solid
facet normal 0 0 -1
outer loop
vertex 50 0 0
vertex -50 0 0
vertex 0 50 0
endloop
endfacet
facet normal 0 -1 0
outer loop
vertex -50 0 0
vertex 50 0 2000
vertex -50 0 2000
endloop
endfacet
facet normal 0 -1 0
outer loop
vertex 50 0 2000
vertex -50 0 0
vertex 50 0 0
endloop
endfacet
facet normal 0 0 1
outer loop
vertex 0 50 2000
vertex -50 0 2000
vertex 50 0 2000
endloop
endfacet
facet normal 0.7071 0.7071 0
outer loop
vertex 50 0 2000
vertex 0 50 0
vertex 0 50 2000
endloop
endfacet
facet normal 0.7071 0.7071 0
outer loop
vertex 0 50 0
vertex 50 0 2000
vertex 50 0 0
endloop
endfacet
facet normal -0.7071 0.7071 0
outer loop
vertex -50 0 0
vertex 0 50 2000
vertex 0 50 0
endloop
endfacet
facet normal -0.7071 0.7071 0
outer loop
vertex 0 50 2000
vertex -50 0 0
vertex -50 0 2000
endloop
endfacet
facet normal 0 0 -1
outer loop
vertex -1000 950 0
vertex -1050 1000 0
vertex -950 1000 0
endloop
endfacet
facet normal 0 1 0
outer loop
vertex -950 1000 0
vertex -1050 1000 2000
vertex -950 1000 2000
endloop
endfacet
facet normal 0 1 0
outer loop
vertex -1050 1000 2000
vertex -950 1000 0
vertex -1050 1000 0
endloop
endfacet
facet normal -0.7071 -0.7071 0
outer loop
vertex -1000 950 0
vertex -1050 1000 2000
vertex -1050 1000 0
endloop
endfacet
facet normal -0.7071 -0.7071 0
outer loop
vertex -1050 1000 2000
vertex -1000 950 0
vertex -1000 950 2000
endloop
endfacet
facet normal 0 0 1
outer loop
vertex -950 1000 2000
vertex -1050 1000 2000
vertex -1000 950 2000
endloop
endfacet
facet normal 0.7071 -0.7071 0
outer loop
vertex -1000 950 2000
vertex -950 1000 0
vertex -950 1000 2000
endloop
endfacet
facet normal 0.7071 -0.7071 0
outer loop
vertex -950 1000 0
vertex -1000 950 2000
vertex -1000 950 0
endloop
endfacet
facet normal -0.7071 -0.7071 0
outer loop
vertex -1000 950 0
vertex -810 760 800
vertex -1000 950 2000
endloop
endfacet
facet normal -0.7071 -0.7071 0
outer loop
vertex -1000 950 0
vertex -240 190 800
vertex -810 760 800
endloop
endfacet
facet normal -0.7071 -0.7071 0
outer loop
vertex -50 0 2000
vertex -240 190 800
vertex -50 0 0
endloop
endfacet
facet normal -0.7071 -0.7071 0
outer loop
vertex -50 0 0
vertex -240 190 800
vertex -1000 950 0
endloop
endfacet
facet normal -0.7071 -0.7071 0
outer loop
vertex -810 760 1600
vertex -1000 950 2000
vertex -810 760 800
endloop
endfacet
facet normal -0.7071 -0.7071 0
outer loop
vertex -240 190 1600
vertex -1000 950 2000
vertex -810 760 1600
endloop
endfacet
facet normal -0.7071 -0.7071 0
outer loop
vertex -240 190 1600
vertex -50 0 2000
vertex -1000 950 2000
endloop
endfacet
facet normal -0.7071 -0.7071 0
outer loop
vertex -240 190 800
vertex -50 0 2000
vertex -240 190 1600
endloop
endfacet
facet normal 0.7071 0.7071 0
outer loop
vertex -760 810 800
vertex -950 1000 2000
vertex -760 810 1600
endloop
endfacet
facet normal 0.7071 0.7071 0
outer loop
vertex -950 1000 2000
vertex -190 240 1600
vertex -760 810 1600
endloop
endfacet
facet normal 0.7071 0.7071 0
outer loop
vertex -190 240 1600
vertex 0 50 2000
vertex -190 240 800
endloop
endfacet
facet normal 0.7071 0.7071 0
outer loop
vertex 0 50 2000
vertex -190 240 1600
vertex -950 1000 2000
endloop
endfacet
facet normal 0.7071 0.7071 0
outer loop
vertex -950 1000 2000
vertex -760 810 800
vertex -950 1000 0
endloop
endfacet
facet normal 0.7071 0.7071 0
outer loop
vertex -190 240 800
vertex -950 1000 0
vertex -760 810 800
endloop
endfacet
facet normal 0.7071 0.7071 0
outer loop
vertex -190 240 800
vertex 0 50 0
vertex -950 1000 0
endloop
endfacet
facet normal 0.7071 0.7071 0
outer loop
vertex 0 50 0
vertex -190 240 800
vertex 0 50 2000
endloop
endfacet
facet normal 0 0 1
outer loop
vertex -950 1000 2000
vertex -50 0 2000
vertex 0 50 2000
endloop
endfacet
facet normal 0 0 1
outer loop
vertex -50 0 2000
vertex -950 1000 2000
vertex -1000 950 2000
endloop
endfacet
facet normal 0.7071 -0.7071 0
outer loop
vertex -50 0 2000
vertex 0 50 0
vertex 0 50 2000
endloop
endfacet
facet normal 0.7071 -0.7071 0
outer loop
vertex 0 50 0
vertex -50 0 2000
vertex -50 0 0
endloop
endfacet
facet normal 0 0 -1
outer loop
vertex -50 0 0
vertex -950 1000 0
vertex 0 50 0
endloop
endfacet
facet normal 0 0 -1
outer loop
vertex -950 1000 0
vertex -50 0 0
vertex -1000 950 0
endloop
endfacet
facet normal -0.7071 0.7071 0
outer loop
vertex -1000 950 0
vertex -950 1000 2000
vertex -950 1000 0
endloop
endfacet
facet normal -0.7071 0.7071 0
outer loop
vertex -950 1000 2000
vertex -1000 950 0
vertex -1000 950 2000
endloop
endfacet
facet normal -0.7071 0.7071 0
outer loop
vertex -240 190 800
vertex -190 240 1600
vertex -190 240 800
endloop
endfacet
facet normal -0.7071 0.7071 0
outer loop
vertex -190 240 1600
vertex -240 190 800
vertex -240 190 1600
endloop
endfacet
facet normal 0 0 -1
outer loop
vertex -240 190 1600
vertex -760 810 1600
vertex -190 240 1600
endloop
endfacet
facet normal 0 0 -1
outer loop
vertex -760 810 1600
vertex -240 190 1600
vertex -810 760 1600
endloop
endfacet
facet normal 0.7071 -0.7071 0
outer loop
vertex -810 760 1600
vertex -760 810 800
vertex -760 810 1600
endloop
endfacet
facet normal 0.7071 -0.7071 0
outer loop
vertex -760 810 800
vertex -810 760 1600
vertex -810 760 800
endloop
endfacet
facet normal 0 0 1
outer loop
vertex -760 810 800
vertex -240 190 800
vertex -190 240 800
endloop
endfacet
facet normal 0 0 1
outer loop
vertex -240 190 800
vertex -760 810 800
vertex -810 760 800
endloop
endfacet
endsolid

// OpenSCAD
// file: ../../../libs/basic-dims.scad
unit = 1000;

section_width = unit;
section_height = unit * 2;
section_thickness = unit * 0.1;

rt = sqrt(2);

//  -- Notes --
//  Z is UP
//  X is FORWARD (out of the screen)
// file: ../../../libs/modifiers/diagonalize.scad
include <../basic-dims.scad>

module diagonalize_triangle_sketch(t = section_thickness) {
    x = sin(45) * t;
    y = cos(45) * t;

    polygon([
        [0, y],
        [x, 0],
        [0, -y]
    ]);
}

module diagonalize_triangle(t = section_thickness) {
    rotate([0, 0, 90])
    linear_extrude(section_height)
    diagonalize_triangle_sketch(t);
}

module diagonalize2D() {
    thickness = section_thickness / rt;

    trans = (section_thickness/2)*rt/2;
    len_scale = rt - section_thickness / (rt * section_width);

    rotate([0, 0, 45])
    translate([trans, 0, 0])
    scale([len_scale, 1/rt, 1])
    children();
}


module diagonalize3D(w = section_width, t = section_thickness, edges = "trans") {

    trans = (t/2)*rt/2;
    len_scale = rt - t / (rt * w);

    edge_angle = edges == "cis" ? 270 : 180;
    
    diagonalize_triangle(t/rt);

    translate([-w, w, 0])
    rotate([0, 0, edge_angle]) // 180 For continue, -90 (270) for end
    diagonalize_triangle(t/rt);

    rotate([0, 0, 45])
    translate([0, trans, 0])
    scale([1/rt, len_scale, 1])
    children();
}
// file: ../../../libs/templates/t_window.scad
include <../basic-dims.scad>

simple_window_width = 0.6 * section_width;
simple_window_height = 0.4 * section_height;
simple_window_bottom_offset = 0.4 * section_height;

module simple_window_sketch() {
    difference() {
        square([section_width, section_height]);

        translate([
            section_width/2 - simple_window_width/2,
            simple_window_bottom_offset,
            0])
        square([simple_window_width, simple_window_height]);
    }
}

module window() {
    rotate([90, 0, 90])
    translate([0, 0, -section_thickness/2])
    linear_extrude(section_thickness)
    simple_window_sketch();
}
// main file
include <../../../libs/templates/t_window.scad>
include <../../../libs/modifiers/diagonalize.scad>

diagonalize3D(edges="trans")
window();
